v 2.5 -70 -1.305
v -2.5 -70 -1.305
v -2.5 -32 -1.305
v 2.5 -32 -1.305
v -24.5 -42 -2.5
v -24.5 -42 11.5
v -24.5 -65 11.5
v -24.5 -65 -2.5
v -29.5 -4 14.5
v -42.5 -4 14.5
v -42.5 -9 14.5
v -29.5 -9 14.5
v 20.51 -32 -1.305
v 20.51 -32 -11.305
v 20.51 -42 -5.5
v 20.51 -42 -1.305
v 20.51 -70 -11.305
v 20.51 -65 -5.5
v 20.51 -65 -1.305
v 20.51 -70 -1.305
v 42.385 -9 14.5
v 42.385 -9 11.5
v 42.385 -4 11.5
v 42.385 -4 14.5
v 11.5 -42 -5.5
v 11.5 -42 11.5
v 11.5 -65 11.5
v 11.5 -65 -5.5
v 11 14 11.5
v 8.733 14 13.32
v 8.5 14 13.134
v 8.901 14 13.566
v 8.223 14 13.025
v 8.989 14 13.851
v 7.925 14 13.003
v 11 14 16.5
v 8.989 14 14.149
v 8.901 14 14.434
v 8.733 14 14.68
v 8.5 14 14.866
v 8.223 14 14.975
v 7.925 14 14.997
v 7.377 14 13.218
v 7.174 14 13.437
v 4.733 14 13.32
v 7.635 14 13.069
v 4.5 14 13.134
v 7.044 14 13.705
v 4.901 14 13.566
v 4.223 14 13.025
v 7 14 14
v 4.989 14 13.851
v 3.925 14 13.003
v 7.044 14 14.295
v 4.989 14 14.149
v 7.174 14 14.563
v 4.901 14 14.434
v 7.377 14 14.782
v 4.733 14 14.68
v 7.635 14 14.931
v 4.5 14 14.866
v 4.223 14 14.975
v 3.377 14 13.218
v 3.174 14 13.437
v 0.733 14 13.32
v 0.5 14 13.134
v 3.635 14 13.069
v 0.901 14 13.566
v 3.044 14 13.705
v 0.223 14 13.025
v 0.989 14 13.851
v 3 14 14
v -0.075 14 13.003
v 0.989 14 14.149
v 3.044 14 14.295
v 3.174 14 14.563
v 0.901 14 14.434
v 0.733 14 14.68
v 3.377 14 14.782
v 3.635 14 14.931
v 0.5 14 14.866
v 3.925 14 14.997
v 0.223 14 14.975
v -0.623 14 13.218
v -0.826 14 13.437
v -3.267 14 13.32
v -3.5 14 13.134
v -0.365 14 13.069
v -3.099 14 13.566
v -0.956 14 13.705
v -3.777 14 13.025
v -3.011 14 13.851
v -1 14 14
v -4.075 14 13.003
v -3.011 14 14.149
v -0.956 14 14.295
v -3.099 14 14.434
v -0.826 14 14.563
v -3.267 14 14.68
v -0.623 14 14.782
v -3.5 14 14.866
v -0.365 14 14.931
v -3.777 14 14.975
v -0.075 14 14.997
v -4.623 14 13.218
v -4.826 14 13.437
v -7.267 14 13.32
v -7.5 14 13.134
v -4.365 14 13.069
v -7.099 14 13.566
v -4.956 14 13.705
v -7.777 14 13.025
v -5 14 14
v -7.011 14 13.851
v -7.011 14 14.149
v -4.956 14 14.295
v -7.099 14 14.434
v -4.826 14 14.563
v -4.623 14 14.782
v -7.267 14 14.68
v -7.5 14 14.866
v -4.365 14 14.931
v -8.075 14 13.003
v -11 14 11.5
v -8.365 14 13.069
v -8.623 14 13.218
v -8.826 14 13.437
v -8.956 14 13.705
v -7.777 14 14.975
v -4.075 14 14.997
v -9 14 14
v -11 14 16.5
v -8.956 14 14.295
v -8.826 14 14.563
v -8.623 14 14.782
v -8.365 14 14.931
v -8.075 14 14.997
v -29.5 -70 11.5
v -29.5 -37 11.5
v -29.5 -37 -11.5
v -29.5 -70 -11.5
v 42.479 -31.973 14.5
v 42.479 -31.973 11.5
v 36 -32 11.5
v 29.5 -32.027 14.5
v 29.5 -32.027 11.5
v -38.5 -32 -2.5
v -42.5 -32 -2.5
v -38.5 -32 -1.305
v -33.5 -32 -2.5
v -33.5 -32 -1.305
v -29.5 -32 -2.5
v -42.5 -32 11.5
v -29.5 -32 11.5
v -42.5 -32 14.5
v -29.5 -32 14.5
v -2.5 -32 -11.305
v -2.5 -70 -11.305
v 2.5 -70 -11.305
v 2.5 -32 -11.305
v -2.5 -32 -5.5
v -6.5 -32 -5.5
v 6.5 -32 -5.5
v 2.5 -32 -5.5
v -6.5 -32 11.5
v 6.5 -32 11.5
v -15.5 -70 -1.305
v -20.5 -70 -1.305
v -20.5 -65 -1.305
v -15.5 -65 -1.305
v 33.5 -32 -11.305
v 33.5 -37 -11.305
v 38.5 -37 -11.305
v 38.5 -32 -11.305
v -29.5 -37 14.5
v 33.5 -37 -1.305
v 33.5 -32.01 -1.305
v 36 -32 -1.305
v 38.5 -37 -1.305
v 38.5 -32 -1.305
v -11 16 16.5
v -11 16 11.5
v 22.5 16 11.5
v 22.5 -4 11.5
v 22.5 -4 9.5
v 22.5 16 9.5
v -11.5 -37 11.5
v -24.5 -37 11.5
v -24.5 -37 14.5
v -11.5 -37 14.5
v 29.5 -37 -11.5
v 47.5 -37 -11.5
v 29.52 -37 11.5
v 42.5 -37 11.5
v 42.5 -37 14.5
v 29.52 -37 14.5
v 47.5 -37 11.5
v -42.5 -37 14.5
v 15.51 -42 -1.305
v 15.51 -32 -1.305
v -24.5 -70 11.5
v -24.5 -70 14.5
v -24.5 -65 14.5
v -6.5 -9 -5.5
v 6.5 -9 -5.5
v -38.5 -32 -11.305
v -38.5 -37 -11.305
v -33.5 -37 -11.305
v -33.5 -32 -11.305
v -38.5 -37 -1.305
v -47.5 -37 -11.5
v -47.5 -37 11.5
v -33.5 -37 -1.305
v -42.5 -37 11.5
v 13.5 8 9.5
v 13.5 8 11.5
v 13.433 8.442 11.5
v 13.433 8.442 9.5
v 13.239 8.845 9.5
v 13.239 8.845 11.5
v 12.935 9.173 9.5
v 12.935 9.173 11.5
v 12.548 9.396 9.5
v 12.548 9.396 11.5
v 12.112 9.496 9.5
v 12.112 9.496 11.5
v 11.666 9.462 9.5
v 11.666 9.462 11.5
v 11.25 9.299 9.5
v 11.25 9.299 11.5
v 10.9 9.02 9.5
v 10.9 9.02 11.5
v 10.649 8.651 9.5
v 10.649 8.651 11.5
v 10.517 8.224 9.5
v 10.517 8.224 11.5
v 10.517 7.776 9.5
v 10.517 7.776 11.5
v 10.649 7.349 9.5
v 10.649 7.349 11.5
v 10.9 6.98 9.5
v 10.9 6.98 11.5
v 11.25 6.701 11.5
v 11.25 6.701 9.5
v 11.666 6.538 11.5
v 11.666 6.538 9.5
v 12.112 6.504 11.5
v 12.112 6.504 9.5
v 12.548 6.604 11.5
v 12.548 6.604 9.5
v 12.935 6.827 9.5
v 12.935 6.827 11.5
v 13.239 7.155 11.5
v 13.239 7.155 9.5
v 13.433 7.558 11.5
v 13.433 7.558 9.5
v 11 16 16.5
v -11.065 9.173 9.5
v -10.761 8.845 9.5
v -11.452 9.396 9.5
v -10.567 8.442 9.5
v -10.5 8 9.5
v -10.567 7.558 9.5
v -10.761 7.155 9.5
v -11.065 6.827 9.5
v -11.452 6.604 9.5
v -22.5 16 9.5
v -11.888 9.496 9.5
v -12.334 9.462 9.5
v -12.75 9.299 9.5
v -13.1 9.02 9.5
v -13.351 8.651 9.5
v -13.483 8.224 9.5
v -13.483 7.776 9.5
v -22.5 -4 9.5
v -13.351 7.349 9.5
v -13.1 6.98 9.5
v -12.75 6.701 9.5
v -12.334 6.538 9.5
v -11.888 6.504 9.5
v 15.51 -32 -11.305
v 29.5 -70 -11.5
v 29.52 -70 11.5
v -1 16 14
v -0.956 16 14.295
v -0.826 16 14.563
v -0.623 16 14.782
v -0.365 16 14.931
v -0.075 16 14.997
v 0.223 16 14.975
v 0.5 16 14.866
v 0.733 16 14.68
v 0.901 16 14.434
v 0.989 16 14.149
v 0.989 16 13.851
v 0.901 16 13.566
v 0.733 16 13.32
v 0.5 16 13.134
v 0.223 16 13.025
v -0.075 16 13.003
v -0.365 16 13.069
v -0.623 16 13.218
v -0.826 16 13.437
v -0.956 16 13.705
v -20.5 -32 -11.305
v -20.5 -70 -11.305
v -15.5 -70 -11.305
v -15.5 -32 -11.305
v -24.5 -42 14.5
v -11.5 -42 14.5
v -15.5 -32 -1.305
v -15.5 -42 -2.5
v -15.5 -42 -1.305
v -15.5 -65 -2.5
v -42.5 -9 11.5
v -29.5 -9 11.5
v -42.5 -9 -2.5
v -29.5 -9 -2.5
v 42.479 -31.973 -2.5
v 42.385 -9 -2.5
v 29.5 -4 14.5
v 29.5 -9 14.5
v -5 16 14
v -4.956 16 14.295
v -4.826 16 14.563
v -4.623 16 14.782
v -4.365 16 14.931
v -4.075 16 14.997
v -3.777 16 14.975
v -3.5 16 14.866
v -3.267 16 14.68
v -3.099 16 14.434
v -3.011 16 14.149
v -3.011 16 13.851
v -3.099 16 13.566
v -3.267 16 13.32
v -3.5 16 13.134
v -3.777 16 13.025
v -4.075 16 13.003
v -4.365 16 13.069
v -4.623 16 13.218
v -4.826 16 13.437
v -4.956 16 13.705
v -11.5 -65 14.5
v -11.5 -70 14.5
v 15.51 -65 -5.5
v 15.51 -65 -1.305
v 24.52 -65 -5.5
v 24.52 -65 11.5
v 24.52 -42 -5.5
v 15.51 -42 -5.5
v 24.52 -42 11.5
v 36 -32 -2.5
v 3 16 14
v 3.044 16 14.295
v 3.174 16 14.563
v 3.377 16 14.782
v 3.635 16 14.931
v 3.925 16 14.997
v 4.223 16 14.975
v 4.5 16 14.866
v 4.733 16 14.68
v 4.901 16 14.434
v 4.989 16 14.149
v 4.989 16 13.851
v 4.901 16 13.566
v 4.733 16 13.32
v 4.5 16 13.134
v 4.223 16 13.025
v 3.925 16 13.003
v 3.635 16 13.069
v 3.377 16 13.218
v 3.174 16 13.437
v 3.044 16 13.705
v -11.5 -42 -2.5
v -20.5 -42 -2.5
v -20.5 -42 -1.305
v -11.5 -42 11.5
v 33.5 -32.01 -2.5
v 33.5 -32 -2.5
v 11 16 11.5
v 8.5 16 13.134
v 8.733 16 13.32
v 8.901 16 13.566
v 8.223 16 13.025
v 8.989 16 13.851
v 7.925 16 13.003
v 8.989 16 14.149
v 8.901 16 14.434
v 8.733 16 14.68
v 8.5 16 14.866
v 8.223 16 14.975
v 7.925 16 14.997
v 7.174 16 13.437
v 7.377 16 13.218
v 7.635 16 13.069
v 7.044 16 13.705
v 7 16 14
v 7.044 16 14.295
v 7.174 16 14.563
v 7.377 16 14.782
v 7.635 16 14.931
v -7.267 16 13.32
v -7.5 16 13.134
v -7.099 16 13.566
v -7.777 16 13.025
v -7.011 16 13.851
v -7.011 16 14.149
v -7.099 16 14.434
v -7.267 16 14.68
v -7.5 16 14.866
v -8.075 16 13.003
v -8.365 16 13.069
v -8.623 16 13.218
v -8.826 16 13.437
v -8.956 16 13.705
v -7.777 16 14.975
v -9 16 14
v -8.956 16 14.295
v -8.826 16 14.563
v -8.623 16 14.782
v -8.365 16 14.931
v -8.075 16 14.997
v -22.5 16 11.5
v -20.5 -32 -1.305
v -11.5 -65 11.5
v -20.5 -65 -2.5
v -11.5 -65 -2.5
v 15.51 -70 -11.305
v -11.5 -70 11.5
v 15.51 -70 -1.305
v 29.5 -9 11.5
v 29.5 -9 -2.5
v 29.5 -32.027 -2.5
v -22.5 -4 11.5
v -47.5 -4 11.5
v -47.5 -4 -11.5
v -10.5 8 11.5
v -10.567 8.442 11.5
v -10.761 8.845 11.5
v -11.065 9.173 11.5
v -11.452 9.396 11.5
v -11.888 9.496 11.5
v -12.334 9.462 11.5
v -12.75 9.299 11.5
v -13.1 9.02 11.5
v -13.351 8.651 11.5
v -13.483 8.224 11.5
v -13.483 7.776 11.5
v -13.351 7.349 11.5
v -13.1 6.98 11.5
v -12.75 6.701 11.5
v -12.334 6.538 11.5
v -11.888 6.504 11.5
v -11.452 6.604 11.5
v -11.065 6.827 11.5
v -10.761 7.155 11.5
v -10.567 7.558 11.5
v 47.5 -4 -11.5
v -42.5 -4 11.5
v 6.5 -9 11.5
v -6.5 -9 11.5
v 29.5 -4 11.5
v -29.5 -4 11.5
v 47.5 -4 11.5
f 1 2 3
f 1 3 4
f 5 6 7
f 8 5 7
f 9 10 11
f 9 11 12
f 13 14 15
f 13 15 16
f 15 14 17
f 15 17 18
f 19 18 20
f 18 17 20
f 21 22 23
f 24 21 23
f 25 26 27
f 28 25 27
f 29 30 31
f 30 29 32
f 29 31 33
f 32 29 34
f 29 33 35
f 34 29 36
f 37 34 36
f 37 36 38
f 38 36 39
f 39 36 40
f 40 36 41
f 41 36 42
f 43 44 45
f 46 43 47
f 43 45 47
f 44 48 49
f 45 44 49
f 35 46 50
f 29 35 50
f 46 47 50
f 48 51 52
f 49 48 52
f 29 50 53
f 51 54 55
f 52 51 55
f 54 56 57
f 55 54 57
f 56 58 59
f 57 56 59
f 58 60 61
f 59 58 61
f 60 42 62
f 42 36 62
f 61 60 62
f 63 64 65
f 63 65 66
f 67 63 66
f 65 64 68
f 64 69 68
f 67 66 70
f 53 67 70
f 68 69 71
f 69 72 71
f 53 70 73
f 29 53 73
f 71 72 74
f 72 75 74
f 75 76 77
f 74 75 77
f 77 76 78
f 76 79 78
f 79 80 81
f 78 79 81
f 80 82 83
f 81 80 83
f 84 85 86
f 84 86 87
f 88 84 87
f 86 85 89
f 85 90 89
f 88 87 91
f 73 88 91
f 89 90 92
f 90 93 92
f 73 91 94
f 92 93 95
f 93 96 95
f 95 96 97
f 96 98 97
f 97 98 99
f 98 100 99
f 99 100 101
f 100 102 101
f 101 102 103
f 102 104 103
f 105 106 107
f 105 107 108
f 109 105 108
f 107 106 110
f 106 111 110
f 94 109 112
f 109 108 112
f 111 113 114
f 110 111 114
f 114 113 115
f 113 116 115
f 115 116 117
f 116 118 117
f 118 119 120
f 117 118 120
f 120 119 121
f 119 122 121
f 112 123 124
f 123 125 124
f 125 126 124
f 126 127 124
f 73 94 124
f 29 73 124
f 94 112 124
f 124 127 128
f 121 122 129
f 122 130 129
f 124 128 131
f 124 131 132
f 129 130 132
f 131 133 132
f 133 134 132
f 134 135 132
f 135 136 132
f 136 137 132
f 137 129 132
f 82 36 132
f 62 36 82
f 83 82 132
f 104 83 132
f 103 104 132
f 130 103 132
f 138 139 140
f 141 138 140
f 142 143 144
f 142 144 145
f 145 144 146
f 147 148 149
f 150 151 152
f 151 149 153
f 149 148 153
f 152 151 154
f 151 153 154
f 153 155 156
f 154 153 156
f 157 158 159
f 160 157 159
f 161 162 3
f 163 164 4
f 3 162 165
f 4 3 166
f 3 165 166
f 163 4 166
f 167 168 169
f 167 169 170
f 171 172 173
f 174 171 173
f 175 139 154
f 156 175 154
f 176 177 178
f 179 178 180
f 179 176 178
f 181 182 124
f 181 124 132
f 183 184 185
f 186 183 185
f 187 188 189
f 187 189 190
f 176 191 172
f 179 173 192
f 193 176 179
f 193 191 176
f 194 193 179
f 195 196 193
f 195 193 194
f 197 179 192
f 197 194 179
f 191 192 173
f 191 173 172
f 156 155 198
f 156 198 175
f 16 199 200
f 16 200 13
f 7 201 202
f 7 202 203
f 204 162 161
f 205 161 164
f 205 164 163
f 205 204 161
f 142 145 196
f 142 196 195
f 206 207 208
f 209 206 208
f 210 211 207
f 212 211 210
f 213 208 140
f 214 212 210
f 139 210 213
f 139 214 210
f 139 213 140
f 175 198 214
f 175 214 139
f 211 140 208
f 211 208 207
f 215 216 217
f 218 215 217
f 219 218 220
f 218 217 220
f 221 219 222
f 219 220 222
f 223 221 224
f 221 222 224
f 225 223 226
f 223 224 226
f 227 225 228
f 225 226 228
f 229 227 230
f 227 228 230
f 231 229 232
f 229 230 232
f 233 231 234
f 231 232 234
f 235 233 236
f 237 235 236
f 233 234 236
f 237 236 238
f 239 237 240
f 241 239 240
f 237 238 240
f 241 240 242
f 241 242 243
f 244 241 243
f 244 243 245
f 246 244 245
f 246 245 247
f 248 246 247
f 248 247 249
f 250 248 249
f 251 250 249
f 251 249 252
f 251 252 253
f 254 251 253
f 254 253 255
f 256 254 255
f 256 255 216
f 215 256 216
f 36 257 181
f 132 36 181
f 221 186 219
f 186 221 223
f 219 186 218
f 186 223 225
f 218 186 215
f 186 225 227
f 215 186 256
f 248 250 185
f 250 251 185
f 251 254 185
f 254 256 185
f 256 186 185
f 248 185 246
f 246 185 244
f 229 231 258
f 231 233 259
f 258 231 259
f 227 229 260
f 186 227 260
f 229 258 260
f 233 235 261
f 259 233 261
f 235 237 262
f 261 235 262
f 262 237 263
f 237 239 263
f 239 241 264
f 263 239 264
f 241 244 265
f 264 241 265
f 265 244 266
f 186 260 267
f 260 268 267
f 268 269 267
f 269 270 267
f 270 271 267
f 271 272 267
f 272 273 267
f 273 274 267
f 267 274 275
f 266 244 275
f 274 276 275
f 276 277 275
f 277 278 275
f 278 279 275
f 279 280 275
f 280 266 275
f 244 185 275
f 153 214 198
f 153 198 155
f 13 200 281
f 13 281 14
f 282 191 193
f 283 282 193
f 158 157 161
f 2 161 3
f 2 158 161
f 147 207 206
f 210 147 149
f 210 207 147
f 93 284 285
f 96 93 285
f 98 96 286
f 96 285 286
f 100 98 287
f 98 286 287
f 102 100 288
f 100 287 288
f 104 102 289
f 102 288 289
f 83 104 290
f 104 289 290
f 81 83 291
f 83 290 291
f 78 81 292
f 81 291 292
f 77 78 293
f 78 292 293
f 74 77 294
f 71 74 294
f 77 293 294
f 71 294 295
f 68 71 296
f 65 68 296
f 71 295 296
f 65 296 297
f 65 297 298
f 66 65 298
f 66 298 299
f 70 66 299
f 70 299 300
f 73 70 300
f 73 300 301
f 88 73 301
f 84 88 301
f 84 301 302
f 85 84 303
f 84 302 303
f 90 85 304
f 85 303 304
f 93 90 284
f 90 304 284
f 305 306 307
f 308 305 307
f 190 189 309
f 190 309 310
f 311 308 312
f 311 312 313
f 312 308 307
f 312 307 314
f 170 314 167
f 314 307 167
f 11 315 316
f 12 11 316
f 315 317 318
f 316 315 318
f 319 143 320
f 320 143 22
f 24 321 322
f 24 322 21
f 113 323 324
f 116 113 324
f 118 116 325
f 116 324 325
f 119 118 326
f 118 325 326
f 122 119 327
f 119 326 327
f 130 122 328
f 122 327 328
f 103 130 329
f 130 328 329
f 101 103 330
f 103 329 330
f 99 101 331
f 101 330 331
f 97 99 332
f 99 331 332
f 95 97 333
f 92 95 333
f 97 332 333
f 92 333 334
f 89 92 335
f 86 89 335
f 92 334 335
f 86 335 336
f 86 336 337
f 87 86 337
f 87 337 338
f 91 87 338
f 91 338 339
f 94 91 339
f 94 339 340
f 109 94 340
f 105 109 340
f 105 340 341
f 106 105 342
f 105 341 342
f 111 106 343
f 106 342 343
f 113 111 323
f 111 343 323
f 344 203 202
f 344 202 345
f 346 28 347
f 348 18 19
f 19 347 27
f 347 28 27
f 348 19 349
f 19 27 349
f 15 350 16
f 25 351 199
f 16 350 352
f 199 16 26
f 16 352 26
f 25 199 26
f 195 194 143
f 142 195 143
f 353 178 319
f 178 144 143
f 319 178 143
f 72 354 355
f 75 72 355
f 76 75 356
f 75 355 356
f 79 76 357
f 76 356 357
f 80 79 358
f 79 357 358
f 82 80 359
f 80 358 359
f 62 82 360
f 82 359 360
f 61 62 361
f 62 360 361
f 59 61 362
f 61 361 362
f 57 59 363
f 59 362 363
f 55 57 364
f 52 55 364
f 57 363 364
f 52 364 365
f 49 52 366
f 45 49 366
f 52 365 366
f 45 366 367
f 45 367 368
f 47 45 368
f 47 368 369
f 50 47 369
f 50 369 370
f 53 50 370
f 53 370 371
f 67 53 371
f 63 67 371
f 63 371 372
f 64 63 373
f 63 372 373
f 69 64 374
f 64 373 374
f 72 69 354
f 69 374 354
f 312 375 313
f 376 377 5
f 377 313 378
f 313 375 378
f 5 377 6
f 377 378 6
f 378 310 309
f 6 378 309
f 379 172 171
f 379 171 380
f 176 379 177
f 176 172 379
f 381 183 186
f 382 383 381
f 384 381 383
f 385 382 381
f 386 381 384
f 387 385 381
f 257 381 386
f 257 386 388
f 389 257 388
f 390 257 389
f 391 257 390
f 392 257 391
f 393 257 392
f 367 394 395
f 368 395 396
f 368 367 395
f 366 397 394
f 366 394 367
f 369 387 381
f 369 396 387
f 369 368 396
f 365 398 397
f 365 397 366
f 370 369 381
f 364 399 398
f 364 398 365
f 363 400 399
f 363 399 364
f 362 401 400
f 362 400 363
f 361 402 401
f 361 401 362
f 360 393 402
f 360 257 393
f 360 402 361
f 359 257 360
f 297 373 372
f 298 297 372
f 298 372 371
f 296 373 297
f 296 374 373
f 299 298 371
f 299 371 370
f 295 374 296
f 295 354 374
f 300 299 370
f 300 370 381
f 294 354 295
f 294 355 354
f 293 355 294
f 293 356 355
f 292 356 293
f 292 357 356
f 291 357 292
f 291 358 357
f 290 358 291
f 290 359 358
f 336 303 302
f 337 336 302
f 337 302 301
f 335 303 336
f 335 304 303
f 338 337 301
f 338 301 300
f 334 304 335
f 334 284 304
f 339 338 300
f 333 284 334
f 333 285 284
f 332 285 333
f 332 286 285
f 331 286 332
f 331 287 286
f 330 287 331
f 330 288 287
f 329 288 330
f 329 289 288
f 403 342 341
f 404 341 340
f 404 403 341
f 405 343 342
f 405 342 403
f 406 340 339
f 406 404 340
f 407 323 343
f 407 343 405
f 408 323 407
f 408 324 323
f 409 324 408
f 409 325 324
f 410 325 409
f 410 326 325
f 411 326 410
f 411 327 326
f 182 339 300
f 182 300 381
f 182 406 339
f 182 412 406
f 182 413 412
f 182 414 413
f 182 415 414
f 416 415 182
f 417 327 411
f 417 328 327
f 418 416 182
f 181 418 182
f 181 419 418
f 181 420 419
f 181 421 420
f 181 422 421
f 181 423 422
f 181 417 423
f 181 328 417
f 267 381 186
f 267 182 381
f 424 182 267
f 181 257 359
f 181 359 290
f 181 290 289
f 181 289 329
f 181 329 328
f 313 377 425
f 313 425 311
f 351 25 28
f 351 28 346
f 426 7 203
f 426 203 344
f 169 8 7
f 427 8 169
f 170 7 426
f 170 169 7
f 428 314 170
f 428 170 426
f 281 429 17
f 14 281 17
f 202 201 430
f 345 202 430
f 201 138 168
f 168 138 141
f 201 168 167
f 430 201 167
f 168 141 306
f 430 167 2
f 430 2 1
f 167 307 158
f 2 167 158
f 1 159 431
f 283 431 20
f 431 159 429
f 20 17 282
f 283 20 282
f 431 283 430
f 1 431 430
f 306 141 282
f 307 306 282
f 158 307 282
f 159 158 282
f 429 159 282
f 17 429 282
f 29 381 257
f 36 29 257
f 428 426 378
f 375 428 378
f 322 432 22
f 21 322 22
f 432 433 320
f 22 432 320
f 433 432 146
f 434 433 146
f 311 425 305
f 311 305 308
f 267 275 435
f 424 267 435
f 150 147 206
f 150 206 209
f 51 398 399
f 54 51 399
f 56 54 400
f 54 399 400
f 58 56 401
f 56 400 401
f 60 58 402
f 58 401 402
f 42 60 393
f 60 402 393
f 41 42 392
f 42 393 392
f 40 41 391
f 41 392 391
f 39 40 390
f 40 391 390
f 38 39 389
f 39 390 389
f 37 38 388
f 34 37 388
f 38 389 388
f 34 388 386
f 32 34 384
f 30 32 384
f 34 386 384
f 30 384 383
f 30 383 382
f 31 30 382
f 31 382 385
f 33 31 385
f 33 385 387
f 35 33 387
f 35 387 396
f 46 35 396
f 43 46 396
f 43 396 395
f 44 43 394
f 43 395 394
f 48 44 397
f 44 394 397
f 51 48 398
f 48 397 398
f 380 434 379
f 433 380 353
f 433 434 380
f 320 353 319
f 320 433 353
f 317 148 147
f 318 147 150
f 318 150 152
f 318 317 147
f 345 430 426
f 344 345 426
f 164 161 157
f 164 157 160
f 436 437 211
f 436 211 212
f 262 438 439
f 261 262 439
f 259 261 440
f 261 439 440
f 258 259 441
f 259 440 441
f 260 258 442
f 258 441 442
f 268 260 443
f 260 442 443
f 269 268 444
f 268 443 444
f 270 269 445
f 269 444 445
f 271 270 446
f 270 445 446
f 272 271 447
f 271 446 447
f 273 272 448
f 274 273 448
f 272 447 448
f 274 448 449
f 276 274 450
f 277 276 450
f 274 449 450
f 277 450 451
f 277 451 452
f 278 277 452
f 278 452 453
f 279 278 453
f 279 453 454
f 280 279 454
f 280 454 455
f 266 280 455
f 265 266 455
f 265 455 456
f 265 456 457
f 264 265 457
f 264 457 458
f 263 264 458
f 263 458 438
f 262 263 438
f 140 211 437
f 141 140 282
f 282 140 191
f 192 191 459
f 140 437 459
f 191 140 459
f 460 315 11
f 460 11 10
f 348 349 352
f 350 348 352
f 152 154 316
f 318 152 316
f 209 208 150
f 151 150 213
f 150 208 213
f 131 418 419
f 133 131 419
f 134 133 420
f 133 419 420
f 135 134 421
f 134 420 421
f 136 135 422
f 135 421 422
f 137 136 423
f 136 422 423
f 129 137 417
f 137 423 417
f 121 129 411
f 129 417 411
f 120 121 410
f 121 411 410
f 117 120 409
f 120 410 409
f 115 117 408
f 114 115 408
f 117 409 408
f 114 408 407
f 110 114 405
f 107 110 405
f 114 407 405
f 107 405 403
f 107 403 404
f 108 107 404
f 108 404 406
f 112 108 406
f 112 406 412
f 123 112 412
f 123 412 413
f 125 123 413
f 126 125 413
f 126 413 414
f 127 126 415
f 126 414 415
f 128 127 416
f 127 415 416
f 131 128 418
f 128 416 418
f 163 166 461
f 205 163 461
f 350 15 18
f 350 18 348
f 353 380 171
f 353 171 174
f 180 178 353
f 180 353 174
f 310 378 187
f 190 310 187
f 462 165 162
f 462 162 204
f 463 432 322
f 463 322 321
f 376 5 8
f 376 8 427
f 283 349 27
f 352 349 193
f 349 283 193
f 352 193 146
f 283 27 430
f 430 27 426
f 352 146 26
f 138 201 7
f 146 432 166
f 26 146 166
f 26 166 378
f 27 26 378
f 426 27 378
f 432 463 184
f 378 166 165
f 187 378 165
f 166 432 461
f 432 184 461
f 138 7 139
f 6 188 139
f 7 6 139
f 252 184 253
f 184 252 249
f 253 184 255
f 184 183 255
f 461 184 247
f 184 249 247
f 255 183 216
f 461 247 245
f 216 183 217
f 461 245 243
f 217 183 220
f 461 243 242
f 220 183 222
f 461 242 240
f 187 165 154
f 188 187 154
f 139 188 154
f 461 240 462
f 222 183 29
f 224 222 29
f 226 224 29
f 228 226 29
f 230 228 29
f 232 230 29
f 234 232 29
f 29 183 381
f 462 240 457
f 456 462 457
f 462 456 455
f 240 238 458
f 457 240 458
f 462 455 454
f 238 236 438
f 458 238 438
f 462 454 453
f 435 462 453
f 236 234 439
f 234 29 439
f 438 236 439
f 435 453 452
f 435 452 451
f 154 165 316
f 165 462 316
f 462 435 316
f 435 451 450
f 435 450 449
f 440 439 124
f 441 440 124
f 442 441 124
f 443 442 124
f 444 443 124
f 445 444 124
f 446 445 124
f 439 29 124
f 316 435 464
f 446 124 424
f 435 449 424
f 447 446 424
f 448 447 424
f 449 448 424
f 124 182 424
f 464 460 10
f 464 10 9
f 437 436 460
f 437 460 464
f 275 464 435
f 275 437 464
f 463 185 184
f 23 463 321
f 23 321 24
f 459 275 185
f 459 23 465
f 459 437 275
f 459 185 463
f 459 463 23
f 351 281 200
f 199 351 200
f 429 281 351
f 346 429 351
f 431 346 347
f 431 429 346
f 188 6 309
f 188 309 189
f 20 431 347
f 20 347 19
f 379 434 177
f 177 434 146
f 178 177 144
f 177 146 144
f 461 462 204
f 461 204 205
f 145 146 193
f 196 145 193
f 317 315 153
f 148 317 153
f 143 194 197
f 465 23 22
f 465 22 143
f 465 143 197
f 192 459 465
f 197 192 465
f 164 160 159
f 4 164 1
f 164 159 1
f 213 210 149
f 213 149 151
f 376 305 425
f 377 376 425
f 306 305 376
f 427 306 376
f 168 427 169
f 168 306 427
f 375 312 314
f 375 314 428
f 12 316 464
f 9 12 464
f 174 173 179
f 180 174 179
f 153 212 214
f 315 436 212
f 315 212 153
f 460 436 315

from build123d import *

# Parameters (mm, degrees)
F0_W      = 50
F0_H      = 16
F1_DEPTH  = 4
F2_W      = 95
F2_H      = 23
F3_DEPTH  = 33
F4_W      = 13
F4_H      = 23
F5_DEPTH  = 17
F6_DEPTH  = 14
F7_DEPTH  = 14
F8_W      = 13
F8_H      = 5
F8_W_2    = 12.8848927021
F9_DEPTH  = 3
F10_W     = 50
F10_H     = 16
F11_DEPTH = 4
F13_DEPTH = 20
F15_DEPTH = 33
F17_DEPTH = 14
F18_DEPTH = 17
F19_W     = 13
F19_H     = 5
F20_DEPTH = 3
F21_R     = 1.5
F22_DEPTH = 23.001
F23_W     = 5
F23_H     = 10
F24_DEPTH = 38
F25_W     = 22
F25_H     = 5
F25_R     = 1
F26_DEPTH = 2


with BuildPart() as f1:
    # F0 (on Front) → F1 (new body)
    with BuildSketch(Plane.XZ):
        Rectangle(F0_W, F0_H)
    extrude(amount=F1_DEPTH)

    # F2 (on face) → F3 (join)
    with BuildSketch(Plane.XZ.offset(4)):
        Rectangle(F2_W, F2_H)
    extrude(amount=F3_DEPTH)

    # F4 (on face) → F5 (cut)
    with BuildSketch(Plane.XY.offset(11.5)):
        with Locations((0, -20.5)):
            Rectangle(F4_W, F4_H)
    extrude(amount=-F5_DEPTH, mode=Mode.SUBTRACT)

    # F4 (on face) → F6 (cut)
    with BuildSketch(Plane.XY.offset(11.5)):
        Polygon((-29.5, -9), (-35.269472748, -9), (-42.5, -9), (-42.5, -21.713828668), (-42.5, -32), (-35.5076789856, -32), (-29.5, -32), (-29.5, -21.9520311803), align=None)
    extrude(amount=-F6_DEPTH, mode=Mode.SUBTRACT)

    # F4 (on face) → F7 (cut)
    with BuildSketch(Plane.XY.offset(11.5)):
        Polygon((42.4793356239, -31.9733636137), (42.3848927021, -9), (29.5, -9), (29.5, -22.5475411862), (29.5, -32.026721337), (36, -32), align=None)
    extrude(amount=-F7_DEPTH, mode=Mode.SUBTRACT)

    # F8 (on face) → F9 (join)
    with BuildSketch(Plane.XY.offset(11.5)):
        with Locations((-36, -6.5)):
            Rectangle(F8_W, F8_H)
        with Locations((-36, -34.5)):
            Rectangle(F8_W, F8_H)
        with Locations((35.9424463511, -6.5)):
            Rectangle(F8_W_2, F8_H)
        Polygon((29.5, -32.026721337), (29.5204450239, -37), (42.5, -37), (42.4793356239, -31.9733636137), align=None)
    extrude(amount=F9_DEPTH)

    # F10 (on face) → F11 (cut, through all)
    with BuildSketch(Plane(origin=(0, 0, 0), x_dir=(-1, 0, 0), z_dir=(0, 1, 0))):
        Rectangle(F10_W, F10_H)
    extrude(amount=-F11_DEPTH, mode=Mode.SUBTRACT)

    # F12 (on face) → F13 (join)
    with BuildSketch(Plane(origin=(0, -4, 0), x_dir=(-1, 0, 0), z_dir=(0, 1, 0))):
        Polygon((22.5, 9.5), (22.5, 11.5), (0, 11.5), (-22.5, 11.5), (-22.5, 9.5), align=None)
    extrude(amount=F13_DEPTH)

    # F14 (on face) → F15 (join)
    with BuildSketch(Plane.XZ.offset(37)):
        Polygon((-29.5, -11.5), (0, -11.5), (29.5, -11.5), (29.5204450239, 11.5), (-29.5, 11.5), align=None)
    extrude(amount=F15_DEPTH)

    # F16 (on face) → F17 (cut)
    with BuildSketch(Plane.XY.offset(11.5)):
        Polygon((-24.5, -65), (-17.6737755537, -65), (-11.5, -65), (-11.5, -54.9432039261), (-11.5, -42), (-18.178511411, -42), (-24.5, -42), (-24.5, -55.7003095746), align=None)
    extrude(amount=-F17_DEPTH, mode=Mode.SUBTRACT)

    # F16 (on face) → F18 (cut)
    with BuildSketch(Plane.XY.offset(11.5)):
        Polygon((24.5204450239, -42), (17.1529948711, -42), (11.5, -42), (11.5, -54.9432039261), (11.5, -65), (19.4243043661, -65), (24.5204450239, -65), (24.5204450239, -53.5), align=None)
    extrude(amount=-F18_DEPTH, mode=Mode.SUBTRACT)

    # F19 (on face) → F20 (join)
    with BuildSketch(Plane.XY.offset(11.5)):
        with Locations((-18, -67.5)):
            Rectangle(F19_W, F19_H)
        with Locations((-18, -39.5)):
            Rectangle(F19_W, F19_H)
    extrude(amount=F20_DEPTH)

    # F21 (on face) → F22 (cut, through all)
    with BuildSketch(Plane.XY.offset(11.5)):
        with Locations((-12, 8)):
            Circle(F21_R)
        with Locations((12, 8)):
            Circle(F21_R)
    extrude(amount=-F22_DEPTH, mode=Mode.SUBTRACT)

    # F23 (on face) → F24 (cut, through all)
    with BuildSketch(Plane.XZ.offset(70)):
        with Locations((-18, -6.3054482453)):
            Rectangle(F23_W, F23_H)
        with Locations((0, -6.3054482453)):
            Rectangle(F23_W, F23_H)
        with Locations((18.0102225119, -6.3054482453)):
            Rectangle(F23_W, F23_H)
        with Locations((-36, -6.3054482453)):
            Rectangle(F23_W, F23_H)
        with Locations((36, -6.3054482453)):
            Rectangle(F23_W, F23_H)
    extrude(amount=-F24_DEPTH, mode=Mode.SUBTRACT)

    # F25 (on face) → F26 (join)
    with BuildSketch(Plane(origin=(0, 16, 0), x_dir=(-1, 0, 0), z_dir=(0, 1, 0))):
        with Locations((0, 14)):
            Rectangle(F25_W, F25_H)
        with Locations((-8, 14)):
            Circle(F25_R, mode=Mode.SUBTRACT)
        with Locations((-4, 14)):
            Circle(F25_R, mode=Mode.SUBTRACT)
        with Locations((0, 14)):
            Circle(F25_R, mode=Mode.SUBTRACT)
        with Locations((4, 14)):
            Circle(F25_R, mode=Mode.SUBTRACT)
        with Locations((8, 14)):
            Circle(F25_R, mode=Mode.SUBTRACT)
    extrude(amount=-F26_DEPTH)


solid = f1.part
